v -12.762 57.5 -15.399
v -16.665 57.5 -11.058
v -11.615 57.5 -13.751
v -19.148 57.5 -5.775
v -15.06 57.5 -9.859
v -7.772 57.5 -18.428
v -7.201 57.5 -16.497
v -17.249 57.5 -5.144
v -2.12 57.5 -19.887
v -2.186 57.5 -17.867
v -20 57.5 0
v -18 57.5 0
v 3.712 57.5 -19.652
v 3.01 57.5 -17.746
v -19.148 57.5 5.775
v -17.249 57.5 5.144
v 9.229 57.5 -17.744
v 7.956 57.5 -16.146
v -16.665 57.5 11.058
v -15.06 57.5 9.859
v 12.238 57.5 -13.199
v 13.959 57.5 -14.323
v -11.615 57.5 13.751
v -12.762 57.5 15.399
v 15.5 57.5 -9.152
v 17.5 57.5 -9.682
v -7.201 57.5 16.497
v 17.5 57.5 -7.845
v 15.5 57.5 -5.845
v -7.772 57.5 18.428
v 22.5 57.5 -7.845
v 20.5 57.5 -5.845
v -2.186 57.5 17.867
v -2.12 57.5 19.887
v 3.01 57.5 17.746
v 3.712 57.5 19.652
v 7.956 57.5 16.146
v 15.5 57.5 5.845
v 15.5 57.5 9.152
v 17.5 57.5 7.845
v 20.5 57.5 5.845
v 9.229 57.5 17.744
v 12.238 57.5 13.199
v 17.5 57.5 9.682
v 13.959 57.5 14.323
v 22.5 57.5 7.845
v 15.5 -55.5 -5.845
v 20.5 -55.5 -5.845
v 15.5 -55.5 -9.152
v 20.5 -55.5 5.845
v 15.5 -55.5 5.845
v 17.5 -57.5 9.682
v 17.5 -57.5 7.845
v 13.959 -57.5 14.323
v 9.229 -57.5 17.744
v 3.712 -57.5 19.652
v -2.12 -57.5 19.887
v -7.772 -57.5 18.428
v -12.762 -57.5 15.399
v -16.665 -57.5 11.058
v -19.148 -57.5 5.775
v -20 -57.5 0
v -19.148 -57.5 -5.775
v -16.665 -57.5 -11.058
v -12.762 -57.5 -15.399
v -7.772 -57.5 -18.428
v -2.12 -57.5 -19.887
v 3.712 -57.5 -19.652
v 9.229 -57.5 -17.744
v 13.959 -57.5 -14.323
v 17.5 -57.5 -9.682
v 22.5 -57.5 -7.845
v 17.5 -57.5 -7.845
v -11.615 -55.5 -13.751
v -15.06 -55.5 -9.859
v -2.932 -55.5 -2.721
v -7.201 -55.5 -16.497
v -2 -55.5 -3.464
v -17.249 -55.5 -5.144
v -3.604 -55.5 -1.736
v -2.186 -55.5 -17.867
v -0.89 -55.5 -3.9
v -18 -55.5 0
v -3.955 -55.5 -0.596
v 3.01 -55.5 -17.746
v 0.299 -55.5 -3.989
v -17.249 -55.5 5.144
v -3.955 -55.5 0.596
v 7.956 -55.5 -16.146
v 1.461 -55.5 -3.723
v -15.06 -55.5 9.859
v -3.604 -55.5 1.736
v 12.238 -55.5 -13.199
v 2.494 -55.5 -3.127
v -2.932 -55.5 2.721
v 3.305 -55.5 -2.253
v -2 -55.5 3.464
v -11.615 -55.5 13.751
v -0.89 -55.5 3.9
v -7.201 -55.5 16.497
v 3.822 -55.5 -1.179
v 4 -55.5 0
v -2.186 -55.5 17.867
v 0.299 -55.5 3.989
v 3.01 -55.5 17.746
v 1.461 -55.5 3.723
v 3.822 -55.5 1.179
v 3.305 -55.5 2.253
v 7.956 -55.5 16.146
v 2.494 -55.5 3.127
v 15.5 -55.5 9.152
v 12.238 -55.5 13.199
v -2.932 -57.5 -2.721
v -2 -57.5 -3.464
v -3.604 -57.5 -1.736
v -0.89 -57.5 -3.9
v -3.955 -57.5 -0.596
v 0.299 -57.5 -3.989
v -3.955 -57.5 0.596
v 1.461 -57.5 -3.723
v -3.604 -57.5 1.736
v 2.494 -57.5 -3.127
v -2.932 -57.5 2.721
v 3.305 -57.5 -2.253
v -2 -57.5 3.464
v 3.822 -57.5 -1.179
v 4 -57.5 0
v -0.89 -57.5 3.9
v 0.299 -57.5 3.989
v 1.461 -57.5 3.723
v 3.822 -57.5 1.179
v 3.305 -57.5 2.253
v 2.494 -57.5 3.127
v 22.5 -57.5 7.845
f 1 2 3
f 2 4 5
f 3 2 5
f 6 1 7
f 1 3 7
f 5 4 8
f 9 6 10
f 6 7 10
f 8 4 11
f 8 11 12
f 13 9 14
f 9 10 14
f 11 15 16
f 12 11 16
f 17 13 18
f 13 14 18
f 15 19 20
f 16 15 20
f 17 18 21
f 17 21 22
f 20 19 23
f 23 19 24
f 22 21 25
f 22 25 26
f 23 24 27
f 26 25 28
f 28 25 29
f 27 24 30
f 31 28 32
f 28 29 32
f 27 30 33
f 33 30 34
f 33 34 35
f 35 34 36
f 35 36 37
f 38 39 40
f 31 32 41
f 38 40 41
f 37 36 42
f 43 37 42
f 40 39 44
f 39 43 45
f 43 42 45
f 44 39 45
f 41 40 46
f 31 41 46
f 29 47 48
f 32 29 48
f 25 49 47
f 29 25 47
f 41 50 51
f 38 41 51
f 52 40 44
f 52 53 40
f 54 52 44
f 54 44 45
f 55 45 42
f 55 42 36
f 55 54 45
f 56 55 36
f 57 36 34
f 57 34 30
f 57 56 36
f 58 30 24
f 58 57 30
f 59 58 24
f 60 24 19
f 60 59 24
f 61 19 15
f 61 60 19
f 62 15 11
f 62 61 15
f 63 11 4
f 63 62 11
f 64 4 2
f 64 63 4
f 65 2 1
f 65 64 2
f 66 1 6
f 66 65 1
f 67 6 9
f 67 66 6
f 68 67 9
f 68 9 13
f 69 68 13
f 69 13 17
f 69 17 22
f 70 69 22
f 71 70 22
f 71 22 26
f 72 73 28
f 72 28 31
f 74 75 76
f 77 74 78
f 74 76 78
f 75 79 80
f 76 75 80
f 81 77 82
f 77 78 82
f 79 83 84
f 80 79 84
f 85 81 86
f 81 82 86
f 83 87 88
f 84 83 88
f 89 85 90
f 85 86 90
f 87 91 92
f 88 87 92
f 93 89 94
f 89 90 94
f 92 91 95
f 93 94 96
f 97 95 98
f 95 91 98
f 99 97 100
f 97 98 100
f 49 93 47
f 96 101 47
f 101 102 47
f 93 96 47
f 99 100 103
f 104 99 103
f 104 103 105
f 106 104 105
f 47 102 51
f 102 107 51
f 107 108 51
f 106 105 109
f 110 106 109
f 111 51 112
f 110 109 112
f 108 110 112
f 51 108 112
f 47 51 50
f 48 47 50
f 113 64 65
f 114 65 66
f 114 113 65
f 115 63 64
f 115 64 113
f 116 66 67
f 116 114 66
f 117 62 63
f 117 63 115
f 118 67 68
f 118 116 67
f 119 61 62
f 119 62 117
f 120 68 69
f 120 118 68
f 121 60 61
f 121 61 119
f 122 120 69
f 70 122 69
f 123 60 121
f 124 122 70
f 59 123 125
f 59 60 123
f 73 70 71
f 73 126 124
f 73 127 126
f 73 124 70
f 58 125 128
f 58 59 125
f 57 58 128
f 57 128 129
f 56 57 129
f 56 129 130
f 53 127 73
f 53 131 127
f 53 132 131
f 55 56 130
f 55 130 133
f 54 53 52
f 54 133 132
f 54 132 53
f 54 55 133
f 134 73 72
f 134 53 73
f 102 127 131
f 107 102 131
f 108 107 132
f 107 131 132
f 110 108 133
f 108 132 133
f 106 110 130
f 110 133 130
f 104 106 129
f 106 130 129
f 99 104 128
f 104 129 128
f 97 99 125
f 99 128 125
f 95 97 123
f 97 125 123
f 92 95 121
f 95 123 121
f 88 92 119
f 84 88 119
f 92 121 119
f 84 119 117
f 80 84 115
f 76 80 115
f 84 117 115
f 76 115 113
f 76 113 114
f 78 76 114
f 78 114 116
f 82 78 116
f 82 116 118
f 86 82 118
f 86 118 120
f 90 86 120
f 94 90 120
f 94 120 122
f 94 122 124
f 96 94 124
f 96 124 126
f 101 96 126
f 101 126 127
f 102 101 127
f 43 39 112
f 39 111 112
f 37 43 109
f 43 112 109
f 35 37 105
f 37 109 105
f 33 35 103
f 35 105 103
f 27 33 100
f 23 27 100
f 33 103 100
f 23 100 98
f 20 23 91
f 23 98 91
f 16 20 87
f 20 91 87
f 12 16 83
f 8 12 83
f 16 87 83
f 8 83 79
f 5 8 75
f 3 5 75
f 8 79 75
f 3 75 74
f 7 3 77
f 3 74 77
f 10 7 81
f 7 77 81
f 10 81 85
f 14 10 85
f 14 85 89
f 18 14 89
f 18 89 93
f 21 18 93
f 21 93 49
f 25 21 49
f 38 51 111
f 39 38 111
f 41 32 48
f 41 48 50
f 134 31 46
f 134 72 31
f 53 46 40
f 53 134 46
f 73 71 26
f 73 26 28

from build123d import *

# Parameters (mm, degrees)
F1_DEPTH = 57.5
F2_T     = -2
F3_R     = 4
F4_DEPTH = 25


with BuildPart() as f1:
    # F0 (on Front) → F1 (new body, symmetric)
    with BuildSketch(Plane.XZ):
        with BuildLine():
            Line((17.5, 7.8446282016), (17.5, 9.6824583655))
            ThreePointArc((17.5, 9.6824583655), (-20, 0), (17.5, -9.6824583655))
            Line((17.5, -9.6824583655), (17.5, -7.8446282016))
            Line((17.5, -7.8446282016), (22.5, -7.8446282016))
            Line((22.5, -7.8446282016), (22.5, 7.8446282016))
            Line((22.5, 7.8446282016), (17.5, 7.8446282016))
        make_face()
    extrude(amount=F1_DEPTH, both=True)

    # F2
    f2_openings = [f1.faces().sort_by_distance(p)[0] for p in [
        (0.740007, 57.5, 0),
    ]]
    offset(amount=F2_T, openings=f2_openings, kind=Kind.INTERSECTION)

    # F3 (on face) → F4 (cut)
    with BuildSketch(Plane.XZ.offset(57.5)):
        Circle(F3_R)
    extrude(amount=-F4_DEPTH, mode=Mode.SUBTRACT)


solid = f1.part
